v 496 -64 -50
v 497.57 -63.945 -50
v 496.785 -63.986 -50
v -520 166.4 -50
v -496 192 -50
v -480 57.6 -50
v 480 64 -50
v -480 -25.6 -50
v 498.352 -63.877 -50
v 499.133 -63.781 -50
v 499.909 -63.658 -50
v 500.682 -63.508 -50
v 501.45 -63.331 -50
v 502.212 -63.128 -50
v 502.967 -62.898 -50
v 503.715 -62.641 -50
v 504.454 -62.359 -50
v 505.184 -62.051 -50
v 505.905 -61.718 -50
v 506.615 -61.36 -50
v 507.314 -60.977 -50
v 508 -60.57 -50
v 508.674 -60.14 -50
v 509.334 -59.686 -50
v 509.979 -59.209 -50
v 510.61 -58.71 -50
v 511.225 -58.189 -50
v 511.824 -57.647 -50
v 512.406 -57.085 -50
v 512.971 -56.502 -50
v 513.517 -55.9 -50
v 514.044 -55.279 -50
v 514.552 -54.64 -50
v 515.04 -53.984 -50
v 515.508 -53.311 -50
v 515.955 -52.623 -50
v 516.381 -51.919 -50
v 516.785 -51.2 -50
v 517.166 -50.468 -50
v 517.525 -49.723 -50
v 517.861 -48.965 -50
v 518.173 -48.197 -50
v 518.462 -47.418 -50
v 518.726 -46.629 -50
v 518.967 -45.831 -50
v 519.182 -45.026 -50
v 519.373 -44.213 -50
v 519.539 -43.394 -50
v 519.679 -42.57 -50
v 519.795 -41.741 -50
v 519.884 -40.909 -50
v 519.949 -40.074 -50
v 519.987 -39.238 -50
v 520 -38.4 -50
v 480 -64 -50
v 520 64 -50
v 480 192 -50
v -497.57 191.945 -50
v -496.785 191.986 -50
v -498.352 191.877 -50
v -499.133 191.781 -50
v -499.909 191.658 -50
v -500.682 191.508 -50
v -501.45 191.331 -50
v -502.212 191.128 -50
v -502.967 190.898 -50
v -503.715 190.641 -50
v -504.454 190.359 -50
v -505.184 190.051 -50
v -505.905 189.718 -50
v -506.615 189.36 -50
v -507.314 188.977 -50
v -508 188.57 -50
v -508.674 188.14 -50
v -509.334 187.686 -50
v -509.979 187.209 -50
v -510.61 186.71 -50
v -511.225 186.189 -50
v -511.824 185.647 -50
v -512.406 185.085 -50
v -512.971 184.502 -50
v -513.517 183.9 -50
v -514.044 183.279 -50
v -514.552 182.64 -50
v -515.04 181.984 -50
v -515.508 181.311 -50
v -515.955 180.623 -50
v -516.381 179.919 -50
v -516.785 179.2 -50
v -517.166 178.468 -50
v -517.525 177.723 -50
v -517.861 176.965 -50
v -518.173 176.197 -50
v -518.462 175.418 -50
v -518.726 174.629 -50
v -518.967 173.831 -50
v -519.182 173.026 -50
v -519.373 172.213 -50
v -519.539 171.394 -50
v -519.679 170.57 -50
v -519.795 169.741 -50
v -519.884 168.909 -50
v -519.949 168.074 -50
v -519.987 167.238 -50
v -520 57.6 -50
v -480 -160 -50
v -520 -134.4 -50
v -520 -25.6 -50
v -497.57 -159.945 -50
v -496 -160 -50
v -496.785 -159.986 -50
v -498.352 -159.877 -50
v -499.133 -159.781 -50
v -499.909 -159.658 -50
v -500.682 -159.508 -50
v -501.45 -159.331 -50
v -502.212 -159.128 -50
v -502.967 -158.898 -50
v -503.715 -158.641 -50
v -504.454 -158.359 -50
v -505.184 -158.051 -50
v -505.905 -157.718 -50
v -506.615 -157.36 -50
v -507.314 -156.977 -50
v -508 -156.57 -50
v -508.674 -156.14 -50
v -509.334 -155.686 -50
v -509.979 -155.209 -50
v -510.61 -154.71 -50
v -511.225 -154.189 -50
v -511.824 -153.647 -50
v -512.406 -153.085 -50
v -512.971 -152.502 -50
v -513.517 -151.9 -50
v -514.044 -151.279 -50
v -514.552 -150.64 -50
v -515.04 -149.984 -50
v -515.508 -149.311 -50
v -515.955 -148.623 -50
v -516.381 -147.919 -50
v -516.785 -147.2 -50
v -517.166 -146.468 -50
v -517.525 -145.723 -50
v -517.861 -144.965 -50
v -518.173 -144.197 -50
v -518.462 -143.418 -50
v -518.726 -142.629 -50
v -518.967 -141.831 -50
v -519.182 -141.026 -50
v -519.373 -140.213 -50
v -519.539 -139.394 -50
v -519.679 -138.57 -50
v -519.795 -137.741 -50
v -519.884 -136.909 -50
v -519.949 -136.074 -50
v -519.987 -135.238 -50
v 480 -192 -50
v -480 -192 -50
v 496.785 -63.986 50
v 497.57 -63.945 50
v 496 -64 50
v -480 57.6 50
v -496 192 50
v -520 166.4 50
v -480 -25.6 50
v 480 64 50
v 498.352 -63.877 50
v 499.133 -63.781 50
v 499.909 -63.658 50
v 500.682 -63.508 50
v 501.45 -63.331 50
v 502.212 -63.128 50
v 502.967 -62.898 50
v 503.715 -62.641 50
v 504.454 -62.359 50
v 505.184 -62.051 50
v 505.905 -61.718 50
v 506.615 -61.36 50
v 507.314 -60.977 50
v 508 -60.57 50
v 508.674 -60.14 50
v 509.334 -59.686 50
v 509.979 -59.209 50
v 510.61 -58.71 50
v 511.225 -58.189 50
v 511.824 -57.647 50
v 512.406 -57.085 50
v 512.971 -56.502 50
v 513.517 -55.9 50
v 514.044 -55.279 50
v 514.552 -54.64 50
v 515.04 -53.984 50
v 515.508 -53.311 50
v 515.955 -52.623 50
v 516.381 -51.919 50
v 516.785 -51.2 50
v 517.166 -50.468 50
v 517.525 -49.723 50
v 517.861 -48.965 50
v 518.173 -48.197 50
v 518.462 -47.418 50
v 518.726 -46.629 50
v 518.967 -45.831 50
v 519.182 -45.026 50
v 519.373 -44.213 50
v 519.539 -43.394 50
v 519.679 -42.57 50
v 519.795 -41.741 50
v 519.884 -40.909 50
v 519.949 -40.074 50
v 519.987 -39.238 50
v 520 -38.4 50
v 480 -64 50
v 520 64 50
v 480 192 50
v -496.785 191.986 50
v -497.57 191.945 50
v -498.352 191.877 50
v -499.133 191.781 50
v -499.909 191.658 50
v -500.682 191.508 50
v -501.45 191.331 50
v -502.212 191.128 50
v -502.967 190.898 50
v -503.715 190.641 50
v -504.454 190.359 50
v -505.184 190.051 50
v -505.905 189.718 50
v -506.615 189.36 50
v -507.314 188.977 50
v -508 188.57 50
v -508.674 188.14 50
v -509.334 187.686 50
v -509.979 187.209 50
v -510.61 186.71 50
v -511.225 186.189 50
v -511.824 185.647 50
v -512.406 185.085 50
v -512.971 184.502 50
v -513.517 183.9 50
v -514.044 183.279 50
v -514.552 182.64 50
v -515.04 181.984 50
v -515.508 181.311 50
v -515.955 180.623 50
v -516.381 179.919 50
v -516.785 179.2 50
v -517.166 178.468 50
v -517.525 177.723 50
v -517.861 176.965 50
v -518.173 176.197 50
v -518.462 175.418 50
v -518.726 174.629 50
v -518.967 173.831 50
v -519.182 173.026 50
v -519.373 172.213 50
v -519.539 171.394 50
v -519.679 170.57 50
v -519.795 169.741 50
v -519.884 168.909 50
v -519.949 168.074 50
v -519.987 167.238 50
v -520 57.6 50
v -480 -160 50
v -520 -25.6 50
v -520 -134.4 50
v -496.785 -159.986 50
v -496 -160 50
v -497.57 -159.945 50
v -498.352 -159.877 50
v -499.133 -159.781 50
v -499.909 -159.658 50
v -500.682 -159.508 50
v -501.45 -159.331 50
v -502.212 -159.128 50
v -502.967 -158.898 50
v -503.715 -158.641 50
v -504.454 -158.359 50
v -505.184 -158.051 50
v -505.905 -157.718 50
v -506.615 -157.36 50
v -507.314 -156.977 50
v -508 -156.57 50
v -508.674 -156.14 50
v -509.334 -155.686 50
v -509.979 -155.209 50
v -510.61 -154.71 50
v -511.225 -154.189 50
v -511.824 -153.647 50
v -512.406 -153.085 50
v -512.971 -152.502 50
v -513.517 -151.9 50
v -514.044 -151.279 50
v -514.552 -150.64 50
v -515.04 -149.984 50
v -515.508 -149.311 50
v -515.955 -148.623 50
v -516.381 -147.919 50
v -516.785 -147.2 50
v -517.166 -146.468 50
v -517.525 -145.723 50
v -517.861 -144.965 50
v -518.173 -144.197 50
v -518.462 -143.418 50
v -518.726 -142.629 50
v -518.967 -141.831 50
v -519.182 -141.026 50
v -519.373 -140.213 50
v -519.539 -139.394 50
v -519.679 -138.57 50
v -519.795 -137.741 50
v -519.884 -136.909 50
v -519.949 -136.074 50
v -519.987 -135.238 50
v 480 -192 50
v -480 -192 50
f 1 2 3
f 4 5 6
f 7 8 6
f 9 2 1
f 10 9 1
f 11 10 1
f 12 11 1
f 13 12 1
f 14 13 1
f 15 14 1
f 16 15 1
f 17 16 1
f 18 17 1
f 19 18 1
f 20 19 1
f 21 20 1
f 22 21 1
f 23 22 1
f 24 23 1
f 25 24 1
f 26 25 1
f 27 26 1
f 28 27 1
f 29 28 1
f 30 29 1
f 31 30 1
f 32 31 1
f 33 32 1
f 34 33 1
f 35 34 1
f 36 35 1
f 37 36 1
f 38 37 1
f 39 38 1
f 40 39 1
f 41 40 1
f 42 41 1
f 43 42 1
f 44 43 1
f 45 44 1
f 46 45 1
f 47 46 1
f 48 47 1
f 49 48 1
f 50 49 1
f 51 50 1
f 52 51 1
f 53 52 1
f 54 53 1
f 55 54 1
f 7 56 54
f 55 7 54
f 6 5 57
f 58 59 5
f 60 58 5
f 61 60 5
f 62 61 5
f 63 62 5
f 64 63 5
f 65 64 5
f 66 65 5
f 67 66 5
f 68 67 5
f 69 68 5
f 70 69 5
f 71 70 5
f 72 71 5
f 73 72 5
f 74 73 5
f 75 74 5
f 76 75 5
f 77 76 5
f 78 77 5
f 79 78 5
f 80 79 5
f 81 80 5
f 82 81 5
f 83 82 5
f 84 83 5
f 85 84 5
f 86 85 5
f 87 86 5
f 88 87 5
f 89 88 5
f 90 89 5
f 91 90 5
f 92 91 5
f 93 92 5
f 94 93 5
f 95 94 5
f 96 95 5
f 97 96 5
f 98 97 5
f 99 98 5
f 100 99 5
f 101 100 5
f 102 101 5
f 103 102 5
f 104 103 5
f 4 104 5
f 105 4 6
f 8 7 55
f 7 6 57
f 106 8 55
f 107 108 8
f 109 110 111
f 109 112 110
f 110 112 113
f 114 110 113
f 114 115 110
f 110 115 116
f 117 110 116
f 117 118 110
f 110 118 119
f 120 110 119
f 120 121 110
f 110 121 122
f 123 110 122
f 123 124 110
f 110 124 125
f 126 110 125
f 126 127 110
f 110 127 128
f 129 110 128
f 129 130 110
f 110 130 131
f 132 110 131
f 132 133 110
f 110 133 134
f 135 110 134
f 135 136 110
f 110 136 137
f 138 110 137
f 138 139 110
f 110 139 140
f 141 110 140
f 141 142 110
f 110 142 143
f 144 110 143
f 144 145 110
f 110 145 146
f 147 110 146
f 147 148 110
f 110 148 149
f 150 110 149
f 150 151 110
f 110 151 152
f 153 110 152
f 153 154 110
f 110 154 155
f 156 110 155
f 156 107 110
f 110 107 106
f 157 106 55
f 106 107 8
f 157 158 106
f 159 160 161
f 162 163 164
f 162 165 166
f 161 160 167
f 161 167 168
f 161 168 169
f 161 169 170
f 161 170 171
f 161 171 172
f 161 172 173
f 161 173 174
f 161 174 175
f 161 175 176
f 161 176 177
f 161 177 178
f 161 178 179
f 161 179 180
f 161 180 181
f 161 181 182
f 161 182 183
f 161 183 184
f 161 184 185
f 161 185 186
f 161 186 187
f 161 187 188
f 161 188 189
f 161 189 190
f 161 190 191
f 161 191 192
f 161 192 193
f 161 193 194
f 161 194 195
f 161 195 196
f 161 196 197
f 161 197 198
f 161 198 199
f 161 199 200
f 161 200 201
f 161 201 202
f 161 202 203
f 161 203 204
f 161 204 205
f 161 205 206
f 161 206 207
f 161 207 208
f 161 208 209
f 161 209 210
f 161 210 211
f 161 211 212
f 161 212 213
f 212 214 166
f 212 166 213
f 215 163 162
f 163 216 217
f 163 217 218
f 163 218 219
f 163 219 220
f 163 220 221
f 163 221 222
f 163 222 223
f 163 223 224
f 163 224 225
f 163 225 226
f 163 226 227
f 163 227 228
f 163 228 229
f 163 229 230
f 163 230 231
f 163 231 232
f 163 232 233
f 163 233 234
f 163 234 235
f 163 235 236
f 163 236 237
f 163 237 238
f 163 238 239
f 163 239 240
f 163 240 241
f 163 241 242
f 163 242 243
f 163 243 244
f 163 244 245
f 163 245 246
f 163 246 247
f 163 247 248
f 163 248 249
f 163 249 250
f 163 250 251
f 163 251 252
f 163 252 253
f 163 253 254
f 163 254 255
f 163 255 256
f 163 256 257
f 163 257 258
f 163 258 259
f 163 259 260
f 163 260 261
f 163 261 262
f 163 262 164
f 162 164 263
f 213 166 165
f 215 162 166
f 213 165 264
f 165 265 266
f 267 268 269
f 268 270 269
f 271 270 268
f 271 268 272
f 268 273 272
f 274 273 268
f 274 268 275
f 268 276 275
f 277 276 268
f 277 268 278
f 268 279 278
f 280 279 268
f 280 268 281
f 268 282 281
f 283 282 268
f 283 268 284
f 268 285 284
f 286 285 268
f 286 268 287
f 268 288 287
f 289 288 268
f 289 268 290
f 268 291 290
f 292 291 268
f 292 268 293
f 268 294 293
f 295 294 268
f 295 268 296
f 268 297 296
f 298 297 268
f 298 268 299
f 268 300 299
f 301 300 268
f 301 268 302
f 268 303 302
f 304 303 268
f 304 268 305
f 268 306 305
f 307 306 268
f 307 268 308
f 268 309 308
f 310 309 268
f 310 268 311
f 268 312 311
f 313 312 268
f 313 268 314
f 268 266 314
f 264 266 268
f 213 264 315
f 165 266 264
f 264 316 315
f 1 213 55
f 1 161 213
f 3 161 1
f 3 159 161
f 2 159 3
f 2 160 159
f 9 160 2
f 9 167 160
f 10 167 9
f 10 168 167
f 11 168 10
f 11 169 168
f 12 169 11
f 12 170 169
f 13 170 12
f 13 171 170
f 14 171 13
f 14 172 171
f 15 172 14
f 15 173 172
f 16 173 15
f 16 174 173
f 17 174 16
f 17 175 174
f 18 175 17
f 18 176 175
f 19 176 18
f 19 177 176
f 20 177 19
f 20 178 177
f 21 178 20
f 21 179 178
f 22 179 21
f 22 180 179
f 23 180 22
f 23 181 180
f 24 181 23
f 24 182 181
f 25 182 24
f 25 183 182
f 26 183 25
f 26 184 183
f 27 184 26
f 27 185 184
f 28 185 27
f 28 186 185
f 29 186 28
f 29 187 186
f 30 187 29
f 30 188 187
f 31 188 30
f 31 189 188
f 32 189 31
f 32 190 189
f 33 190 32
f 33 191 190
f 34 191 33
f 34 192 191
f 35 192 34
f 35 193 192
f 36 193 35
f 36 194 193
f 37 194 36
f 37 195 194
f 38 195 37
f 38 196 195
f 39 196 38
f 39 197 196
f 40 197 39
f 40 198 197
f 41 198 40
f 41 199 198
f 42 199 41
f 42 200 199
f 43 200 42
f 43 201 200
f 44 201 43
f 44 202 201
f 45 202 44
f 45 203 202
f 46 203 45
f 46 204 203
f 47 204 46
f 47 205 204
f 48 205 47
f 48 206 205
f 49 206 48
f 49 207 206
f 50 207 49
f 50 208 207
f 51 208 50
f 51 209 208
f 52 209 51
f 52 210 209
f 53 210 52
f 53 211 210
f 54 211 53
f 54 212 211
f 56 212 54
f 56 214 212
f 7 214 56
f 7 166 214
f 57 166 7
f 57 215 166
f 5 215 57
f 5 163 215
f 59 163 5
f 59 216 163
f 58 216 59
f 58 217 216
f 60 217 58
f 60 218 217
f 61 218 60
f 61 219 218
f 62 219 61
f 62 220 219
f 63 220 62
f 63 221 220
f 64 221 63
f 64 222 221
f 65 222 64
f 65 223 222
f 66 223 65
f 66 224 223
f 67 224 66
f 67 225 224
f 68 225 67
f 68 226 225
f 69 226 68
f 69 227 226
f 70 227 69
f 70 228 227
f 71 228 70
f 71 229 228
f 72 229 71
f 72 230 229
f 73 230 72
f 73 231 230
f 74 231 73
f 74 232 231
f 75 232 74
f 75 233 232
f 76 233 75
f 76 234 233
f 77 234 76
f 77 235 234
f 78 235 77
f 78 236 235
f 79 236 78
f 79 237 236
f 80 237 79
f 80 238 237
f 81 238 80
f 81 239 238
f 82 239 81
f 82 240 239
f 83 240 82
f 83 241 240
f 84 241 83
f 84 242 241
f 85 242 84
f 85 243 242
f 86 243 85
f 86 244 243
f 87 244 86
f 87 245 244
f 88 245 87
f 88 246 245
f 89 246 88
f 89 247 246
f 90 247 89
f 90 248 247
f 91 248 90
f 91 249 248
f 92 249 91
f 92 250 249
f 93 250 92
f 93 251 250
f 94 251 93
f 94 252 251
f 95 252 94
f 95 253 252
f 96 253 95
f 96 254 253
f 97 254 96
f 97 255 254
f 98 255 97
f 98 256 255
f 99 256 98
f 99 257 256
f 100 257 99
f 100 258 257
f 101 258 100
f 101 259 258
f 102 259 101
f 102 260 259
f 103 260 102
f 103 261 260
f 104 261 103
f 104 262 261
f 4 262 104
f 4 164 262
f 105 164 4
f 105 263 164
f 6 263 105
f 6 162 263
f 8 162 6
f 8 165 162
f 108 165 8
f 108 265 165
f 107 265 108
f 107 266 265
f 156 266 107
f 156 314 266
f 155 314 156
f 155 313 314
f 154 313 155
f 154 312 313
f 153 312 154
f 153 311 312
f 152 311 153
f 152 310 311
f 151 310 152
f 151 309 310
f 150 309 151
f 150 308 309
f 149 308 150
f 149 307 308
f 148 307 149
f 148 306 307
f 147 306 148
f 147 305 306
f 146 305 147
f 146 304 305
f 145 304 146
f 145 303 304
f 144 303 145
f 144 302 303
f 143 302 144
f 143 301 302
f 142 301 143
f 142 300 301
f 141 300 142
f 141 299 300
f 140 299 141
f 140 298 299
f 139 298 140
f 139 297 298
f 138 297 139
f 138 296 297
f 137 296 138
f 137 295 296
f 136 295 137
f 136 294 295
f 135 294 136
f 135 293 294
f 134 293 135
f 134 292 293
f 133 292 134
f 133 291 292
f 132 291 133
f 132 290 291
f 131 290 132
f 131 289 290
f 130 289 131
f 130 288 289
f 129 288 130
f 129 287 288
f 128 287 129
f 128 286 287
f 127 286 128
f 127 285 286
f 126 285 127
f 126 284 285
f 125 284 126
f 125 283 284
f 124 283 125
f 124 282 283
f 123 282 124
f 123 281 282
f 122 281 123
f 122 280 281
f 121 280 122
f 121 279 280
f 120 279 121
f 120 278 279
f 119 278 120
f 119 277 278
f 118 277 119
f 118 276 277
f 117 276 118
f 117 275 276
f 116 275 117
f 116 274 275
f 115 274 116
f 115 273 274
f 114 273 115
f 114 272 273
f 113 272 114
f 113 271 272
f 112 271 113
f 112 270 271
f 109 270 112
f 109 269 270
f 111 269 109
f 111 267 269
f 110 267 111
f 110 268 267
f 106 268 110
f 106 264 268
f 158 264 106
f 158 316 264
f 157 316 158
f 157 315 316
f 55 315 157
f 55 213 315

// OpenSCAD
// file: ../core/quality.scad
// ============================================================================
// MachineBlocks Quality System
// Works with `use <...>` because all exported values are functions.
// ============================================================================

// ----------------------------------------------------------------------------
// Quality classes

function mb_q_functional() = 0; // fit-critical
function mb_q_visual()     = 1; // visible
function mb_q_hidden()     = 2; // internal / invisible

function mb_q_class_from_string(quality) =
    is_num(quality) ? mb_q_clamp(quality, mb_q_functional(), mb_q_hidden()) :
    quality == "functional" ? mb_q_functional() :
    quality == "visual"     ? mb_q_visual()     :
    quality == "hidden"     ? mb_q_hidden()     :
                              mb_q_visual();

// ----------------------------------------------------------------------------
// User quality presets

function mb_q_preview() = 0;
function mb_q_normal()  = 1;
function mb_q_print()   = 2;
function mb_q_render()  = 3;

function mb_q_preset_from_string(quality) =
    is_num(quality) ? mb_q_clamp(quality, mb_q_preview(), mb_q_render()) :
    quality == "preview" ? mb_q_preview() :
    quality == "normal"  ? mb_q_normal()  :
    quality == "print"   ? mb_q_print()   :
    quality == "render"  ? mb_q_render()  :
                           mb_q_normal();

// ----------------------------------------------------------------------------
// Default mappings
//
// Profile row: [segment_length_mm, fn_max]
// Smaller segment length = higher quality.

function mb_q_default_profile() =
[
    [0.55, 32],    // preview
    [0.38, 48],    // normal
    [0.28, 64],    // print
    [0.16, 120]    // render
];

function mb_q_default_class_factors() =
[
    1.00,          // functional
    1.35,          // visual
    2.25           // hidden
];

function mb_q_default_class_min_segments() =
[
    16,            // functional
    12,            // visual
    8              // hidden
];

// ----------------------------------------------------------------------------
// Helpers

function mb_q_clamp(x, a, b) =
    max(a, min(b, x));

function mb_q_make_even(n) =
    (n % 2 == 0) ? n : (n + 1);

function mb_q_max_radius(r) =
    is_list(r)
        ? (
            len(r) == 0
                ? 0
                : max([for (e = r) mb_q_max_radius(e)])
        )
        : r;

// ----------------------------------------------------------------------------
// Preview multiplier
//
// preview_quality:
//   1 = no preview reduction
//   0 = strongest preview reduction
//
// preview_max_mult is applied to segment length, not directly to fn.

function mb_q_preview_mult(preview_quality, preview_max_mult) =
    let(p = mb_q_clamp(preview_quality, 0, 1))
    1 + (1 - p) * (preview_max_mult - 1);

// ----------------------------------------------------------------------------
// Full-circle fn resolver
//
// Contract:
//   returned fn = segment count for a complete 360° circle.
//
// Responsibility:
//   Part/feature chooses class.
//   Shape receives only resolution/fn.

function mb_q_fn_for_radius(
    r,
    q,

    preset = undef,

    profile = undef,
    class_factors = undef,
    class_min_segments = undef,

    segment_multiplier = undef,

    preview_quality = undef,
    preview_max_mult = undef,
    is_preview = $preview
) =
    let(
        qq = mb_q_class_from_string(q),

        pp = mb_q_preset_from_string(preset),

        prof = is_undef(profile)
            ? mb_q_default_profile()
            : profile,

        factors = is_undef(class_factors)
            ? mb_q_default_class_factors()
            : class_factors,

        min_fn = is_undef(class_min_segments)
            ? mb_q_default_class_min_segments()
            : class_min_segments,

        rr = max(0.01, mb_q_max_radius(r)),

        seg_base = prof[pp][0],
        fn_max   = prof[pp][1],

        pm = is_preview
            ? mb_q_preview_mult(
                is_undef(preview_quality) ? 1.0 : preview_quality, 
                is_undef(preview_max_mult) ? 2.5 : preview_max_mult
            )
            : 1.0,

        // Bigger segment length => fewer full-circle segments.
        seg = seg_base * factors[qq] * (is_undef(segment_multiplier) ? 1.0 : segment_multiplier) * pm,

        fn_raw = (2 * PI * rr) / seg,
        fn_rounded = ceil(fn_raw)
    )
    mb_q_clamp(fn_rounded, min_fn[qq], fn_max);

// ----------------------------------------------------------------------------
// Even full-circle fn resolver
//
// Use for cylinders, tubes, studs, holes, and symmetric round geometry.

function mb_q_fn_even_for_radius(
    r,
    q,

    preset = undef,

    profile = undef,
    class_factors = undef,
    class_min_segments = undef,

    segment_multiplier = undef,

    preview_quality = undef,
    preview_max_mult = undef,
    is_preview = $preview
) =
    mb_q_make_even(
        mb_q_fn_for_radius(
            r = r,
            q = q,
            preset = preset,
            profile = profile,
            class_factors = class_factors,
            class_min_segments = class_min_segments,
            segment_multiplier = segment_multiplier,
            preview_quality = preview_quality,
            preview_max_mult = preview_max_mult,
            is_preview = is_preview
        )
    );

// ----------------------------------------------------------------------------
// Partial arc helpers
//
// Preserve the full-circle contract:
//
//   360° -> fn
//   180° -> fn / 2
//    90° -> fn / 4

function mb_q_fn_for_angle(fn, angle, min_n = 3) =
    max(min_n, ceil(fn * abs(angle) / 360));

function mb_q_fn_for_quarter(fn, min_n = 4) =
    mb_q_fn_for_angle(fn, 90, min_n);

function mb_q_fn_for_half(fn, min_n = 6) =
    mb_q_fn_for_angle(fn, 180, min_n);

// ============================================================================
// Usage examples
// ============================================================================

// Stud: functional
module example_q_stud(radius = 2.4, quality = undef) {
    fn = mb_q_fn_even_for_radius(
        r = radius,
        q = mb_q_functional(),
        preset = quality
    );

    cylinder(r = radius, h = 1.8, $fn = fn);
}

// Brick corner: visual
module example_q_brick_corner(radius = 1.0, quality = undef) {
    fn = mb_q_fn_for_radius(
        r = radius,
        q = mb_q_visual(),
        preset = quality
    );

    // mb_corner(radius = radius, resolution = fn);
}

// Groove: hidden
module example_q_groove(radius = 0.3, quality = undef) {
    fn = mb_q_fn_for_radius(
        r = radius,
        q = mb_q_hidden(),
        preset = quality
    );

    // mb_corner(radius = radius, resolution = fn);
}

// Shape-level quarter arc
module example_q_shape_corner(radius = 1.0, resolution = 64) {
    n_a = mb_q_fn_for_quarter(resolution);

    echo(full_circle_resolution = resolution);
    echo(quarter_arc_segments = n_a);
}

function mb_q_fn_for_size(
    size,
    q,
    preset = undef,
    profile = undef,
    class_factors = undef,
    class_min_segments = undef,
    segment_multiplier = undef,
    preview_quality = undef,
    preview_max_mult = undef,
    is_preview = $preview
) =
    mb_q_fn_for_radius(
        r = max(0.5, size / 2),
        q = q,
        preset = preset,
        profile = profile,
        class_factors = class_factors,
        class_min_segments = class_min_segments,
        segment_multiplier = segment_multiplier,
        preview_quality = preview_quality,
        preview_max_mult = preview_max_mult,
        is_preview = is_preview
    );
// main file
use <../core/utils.scad>;
use <../core/quality.scad>;

function _mb_tube_arc_points(cx, cy, rx, ry, a0, a1, segments = 8) =
    [
        for (i = [0:segments])
            let(a = a0 + (a1 - a0) * i / segments)
                [cx + cos(a) * rx, cy + sin(a) * ry]
    ];

function _mb_tube_rr_xy(rr) =
    is_list(rr) ? [max(0, rr[0]), max(0, len(rr) > 1 ? rr[1] : rr[0])]
                : let(r = max(0, is_num(rr) ? rr : 0)) [r, r];

function _mb_tube_scale_rr(rr, mul_r, mul_l) =
    is_list(rr) ? [rr[0] * mul_r, (len(rr) > 1 ? rr[1] : rr[0]) * mul_l]
                : is_num(rr) ? rr * mul_r : 0;

function _mb_tube_rr_max_component(rr) =
    let(xy = _mb_tube_rr_xy(rr))
        max(xy[0], xy[1]);

function _mb_tube_profile_points(
    radius_inner,
    radius_outer,

    start,
    end,

    start_rounding_radius,
    end_rounding_radius,

    clamp_inner_start_thickness,
    clamp_inner_start_height,
    clamp_inner_start_offset,
    clamp_inner_start_rounding_radius,
    
    clamp_inner_end_thickness,
    clamp_inner_end_height,
    clamp_inner_end_offset,
    clamp_inner_end_rounding_radius,

    clamp_outer_start_thickness,
    clamp_outer_start_height,
    clamp_outer_start_offset,
    clamp_outer_start_rounding_radius,
    
    clamp_outer_end_thickness,
    clamp_outer_end_height,
    clamp_outer_end_offset,
    clamp_outer_end_rounding_radius,

    rounding_resolution_edge
) =
    let(
        // radius_inner may be negative (e.g. mb_rail / linear_extrude).
        // mb_tube clamps to >= 0 before calling (rotate_extrude requires x >= 0).
        radius_outer = max(radius_inner, radius_outer),
        ring_thickness = radius_outer - radius_inner,
        max_rr = radius_inner == 0 ? radius_outer : 0.5 * ring_thickness,
        end = max(start, end),
        length = end - start,
        has_inner = radius_inner != 0,

        // Clamp Outer Start
        cbos_offset = min(length, max(0, clamp_outer_start_offset)),
        cbos_height = min(length - cbos_offset, max(0, clamp_outer_start_height)),
        cbos_thickness = clamp_outer_start_thickness < 0 ? sign(clamp_outer_start_thickness) * min(ring_thickness, abs(clamp_outer_start_thickness)) : clamp_outer_start_thickness,
        cbos = cbos_height > 0 && cbos_thickness != 0,
        cbos_rr_raw = _mb_tube_rr_xy(clamp_outer_start_rounding_radius),
        cbos_rx = min(cbos_rr_raw[0], abs(cbos_thickness)),
        cbos_ry = min(cbos_rr_raw[1], cbos_height),
        cbos_round = cbos_rx > 0 && cbos_ry > 0,
        cbos_outer_radius = radius_outer + cbos_thickness,
        cbos_y_start = start + cbos_offset,
        cbos_y_end = cbos_y_start + cbos_height,
        cbos_x_rounding = cbos_outer_radius - sign(clamp_outer_start_thickness) * cbos_rx,
        cbos_y_rounding = cbos_y_start + cbos_ry,

        // Clamp Outer End
        cboe_offset = min(length - cbos_offset - cbos_height, max(0, clamp_outer_end_offset)),
        cboe_height = min(length - cbos_offset - cbos_height - cboe_offset, max(0, clamp_outer_end_height)),
        cboe_thickness = clamp_outer_end_thickness < 0 ? sign(clamp_outer_end_thickness) * min(ring_thickness, abs(clamp_outer_end_thickness)) : clamp_outer_end_thickness,
        cboe = cboe_height > 0 && cboe_thickness != 0,
        cboe_rr_raw = _mb_tube_rr_xy(clamp_outer_end_rounding_radius),
        cboe_rx = min(cboe_rr_raw[0], abs(cboe_thickness)),
        cboe_ry = min(cboe_rr_raw[1], cboe_height),
        cboe_round = cboe_rx > 0 && cboe_ry > 0,
        cboe_outer_radius = radius_outer + cboe_thickness,
        cboe_y_end = end - cboe_offset,
        cboe_y_start = cboe_y_end - cboe_height,
        cboe_x_rounding = cboe_outer_radius - sign(clamp_outer_end_thickness) * cboe_rx,
        cboe_y_rounding = cboe_y_end - cboe_ry,

        // Clamp Inner Start
        cbis_offset = min(length, max(0, clamp_inner_start_offset)),
        cbis_height = min(length - cbis_offset, max(0, clamp_inner_start_height)),
        cbis_thickness = clamp_inner_start_thickness < 0
            ? sign(clamp_inner_start_thickness) * min(ring_thickness, abs(clamp_inner_start_thickness))
            : radius_inner > 0
                ? min(radius_inner, clamp_inner_start_thickness)
                : clamp_inner_start_thickness,
        cbis = has_inner && cbis_height > 0 && cbis_thickness != 0,
        cbis_rr_raw = _mb_tube_rr_xy(clamp_inner_start_rounding_radius),
        cbis_rx = min(cbis_rr_raw[0], abs(cbis_thickness)),
        cbis_ry = min(cbis_rr_raw[1], cbis_height),
        cbis_round = cbis_rx > 0 && cbis_ry > 0,
        cbis_inner_radius = radius_inner - cbis_thickness,
        cbis_y_start = start + cbis_offset,
        cbis_y_end = cbis_y_start + cbis_height,
        cbis_x_rounding = cbis_inner_radius + sign(cbis_thickness) * cbis_rx,
        cbis_y_rounding = cbis_y_start + cbis_ry,

        // Clamp Inner End
        cbie_offset = min(length - cbis_offset - cbis_height, max(0, clamp_inner_end_offset)),
        cbie_height = min(length - cbis_offset - cbis_height - cbie_offset, max(0, clamp_inner_end_height)),
        cbie_thickness = clamp_inner_end_thickness < 0
            ? sign(clamp_inner_end_thickness) * min(ring_thickness, abs(clamp_inner_end_thickness))
            : radius_inner > 0
                ? min(radius_inner, clamp_inner_end_thickness)
                : clamp_inner_end_thickness,
        cbie = has_inner && cbie_height > 0 && cbie_thickness != 0,
        cbie_rr_raw = _mb_tube_rr_xy(clamp_inner_end_rounding_radius),
        cbie_rx = min(cbie_rr_raw[0], abs(cbie_thickness)),
        cbie_ry = min(cbie_rr_raw[1], cbie_height),
        cbie_round = cbie_rx > 0 && cbie_ry > 0,
        cbie_inner_radius = radius_inner - cbie_thickness,
        cbie_y_end = end - cbie_offset,
        cbie_y_start = cbie_y_end - cbie_height,
        cbie_x_rounding = cbie_inner_radius + sign(cbie_thickness) * cbie_rx,
        cbie_y_rounding = cbie_y_end - cbie_ry,

        // Start
        si_rr = min(max(0, start_rounding_radius), max_rr, cbis ? cbis_offset : cbie ? (length - cbie_offset - cbie_height) : length),
        so_rr = min(max(0, start_rounding_radius), max_rr, cbos ? cbos_offset : cboe ? (length - cboe_offset - cboe_height) : length),
        si_x_rounding = radius_inner + si_rr,
        so_x_rounding = radius_outer - so_rr,
        si_y_rounding = start + si_rr,
        so_y_rounding = start + so_rr,

        // End
        ei_rr = min(max(0, end_rounding_radius), max_rr, cbie ? cbie_offset : cbis ? (length - cbis_offset - cbis_height) : length),
        eo_rr = min(max(0, end_rounding_radius), max_rr, cboe ? cboe_offset : cbos ? (length - cbos_offset - cbos_height) : length),
        ei_x_rounding = radius_inner + ei_rr,
        eo_x_rounding = radius_outer - eo_rr,
        ei_y_rounding = end - ei_rr,
        eo_y_rounding = end - eo_rr
    )
    concat(
        // Start Inner
        cbis && cbis_offset == 0 ? [] : concat(
            si_rr > 0 && has_inner ? concat(
                [
                    [radius_inner, si_y_rounding]
                ],
                _mb_tube_arc_points(
                    cx = si_x_rounding,
                    cy = si_y_rounding,
                    rx = si_rr,
                    ry = si_rr,
                    a0 = -90,
                    a1 = -180,
                    segments = rounding_resolution_edge
                )
            ) : [],
            [
                [si_rr > 0 && has_inner ? si_x_rounding : radius_inner, start]
            ]
        ),

        // Start Outer
        cbos && cbos_offset == 0 ? [] : concat(
            [
                [so_rr > 0 ? so_x_rounding : radius_outer, start],
            ],
            so_rr > 0 ? concat(
                _mb_tube_arc_points(
                    cx = so_x_rounding,
                    cy = so_y_rounding,
                    rx = so_rr,
                    ry = so_rr,
                    a0 = -90,
                    a1 = 0,
                    segments = rounding_resolution_edge
                ),
                [
                    [radius_outer, so_y_rounding]
                ]
            ) : []
        ),

        // Clamp Outer Start
        cbos ? concat(
            cbos_offset == 0 ? [] : [
                [radius_outer, cbos_y_start]
            ],
            [
                [cbos_round ? cbos_x_rounding : cbos_outer_radius, cbos_y_start],
            ],
            cbos_round ? _mb_tube_arc_points(
                cx = cbos_x_rounding,
                cy = cbos_y_rounding,
                rx = cbos_rx,
                ry = cbos_ry,
                a0 = -90,
                a1 = cbos_thickness < 0 ? -180 : 0,
                segments = rounding_resolution_edge
            ) : [],
            [
                [cbos_outer_radius, cbos_y_end],
                [radius_outer, cbos_y_end]
            ]
        ) : [],

        // Clamp Outer End
        cboe ? concat(
            [
                [radius_outer, cboe_y_start],
                [cboe_outer_radius, cboe_y_start],
                [cboe_outer_radius, cboe_round ? cboe_y_rounding : cboe_y_end]
            ],
            cboe_round ? _mb_tube_arc_points(
                cx = cboe_x_rounding,
                cy = cboe_y_rounding,
                rx = cboe_rx,
                ry = cboe_ry,
                a0 = cboe_thickness < 0 ? 180 : 0,
                a1 = 90,
                segments = rounding_resolution_edge
            ) : [],
            cboe_offset == 0 ? [] : [
                [radius_outer, cboe_y_end]
            ]
        ) : [],

        // End Outer
        cboe && cboe_offset == 0 ? [] : concat(
            eo_rr > 0 ? concat(
                [
                    [radius_outer, eo_y_rounding],
                ],
                _mb_tube_arc_points(
                    cx = eo_x_rounding,
                    cy = eo_y_rounding,
                    rx = eo_rr,
                    ry = eo_rr,
                    a0 = 0,
                    a1 = 90,
                    segments = rounding_resolution_edge
                )
            ) : [],
            [
                [eo_rr > 0 ? eo_x_rounding : radius_outer, end]
            ]
        ),

        // End Inner
        cbie && cbie_offset == 0 ? [] : concat(
            ei_rr > 0 && has_inner ? concat(
                [
                    [ei_x_rounding, end]
                ],
                _mb_tube_arc_points(
                    cx = ei_x_rounding,
                    cy = ei_y_rounding,
                    rx = ei_rr,
                    ry = ei_rr,
                    a0 = 180,
                    a1 = 90,
                    segments = rounding_resolution_edge
                )
            ) : [],
            [
                [radius_inner, ei_rr > 0 && has_inner ? ei_y_rounding : end]
            ]
        ),

        // Clamp Inner End (walk end→start; structure like Clamp Outer Start)
        cbie ? concat(
            cbie_offset == 0 ? [] : [
                [radius_inner, cbie_y_end]
            ],
            [
                [cbie_round ? cbie_x_rounding : cbie_inner_radius, cbie_y_end],
            ],
            cbie_round ? _mb_tube_arc_points(
                cx = cbie_x_rounding,
                cy = cbie_y_rounding,
                rx = cbie_rx,
                ry = cbie_ry,
                a0 = 90,
                a1 = cbie_thickness < 0 ? 0 : 180,
                segments = rounding_resolution_edge
            ) : [],
            [
                [cbie_inner_radius, cbie_y_start],
                [radius_inner, cbie_y_start]
            ]
        ) : [],

        // Clamp Inner Start (walk end→start; structure like Clamp Outer End)
        cbis ? concat(
            [
                [radius_inner, cbis_y_end],
                [cbis_inner_radius, cbis_y_end],
                [cbis_inner_radius, cbis_round ? cbis_y_rounding : cbis_y_start]
            ],
            cbis_round ? _mb_tube_arc_points(
                cx = cbis_x_rounding,
                cy = cbis_y_rounding,
                rx = cbis_rx,
                ry = cbis_ry,
                a0 = cbis_thickness < 0 ? 0 : 180,
                a1 = cbis_thickness < 0 ? -90 : 270,
                segments = rounding_resolution_edge
            ) : [],
            cbis_offset == 0 ? [] : [
                [radius_inner, cbis_y_start]
            ]
        ) : []
    );

module mb_tube(
    radius,
    length,
    rounding_radius = undef,

    clamp_inner_start = undef,
    clamp_inner_end = undef,
    
    clamp_outer_start = undef,
    clamp_outer_end = undef,

    axis = "z",
    offset = undef,
    mul = undef,
    
    rounding_resolution_tube = 64,
    rounding_resolution_edge = 8,

    quality_class_tube = "functional",
    quality_class_edge = "visual",

    quality = "normal",

    q_profile = undef,
    q_class_factors = undef,
    q_class_min_segments = undef,
    q_segment_multiplier = undef,
    q_preview_quality = undef,
    q_preview_max_mult = undef,

    color = "white",
    draw_together = false,
    debug = false
) {
    axis = mb_axis_to_int(axis);
    offset = mb_resolve_xyz(offset, default = [0, 0, 0]);
    mul = mb_resolve_xyz(mul, default = [1, 1, 1]);
    mul_radius = mul[0];
    mul_length = mul[axis];

    start = (is_list(length) ? length[0] : is_num(length) ? -0.5 * length : 0) * mul_length; 
    end = (is_list(length) ? length[1] : is_num(length) ? 0.5 * length : 0) * mul_length;

    radius_inner = max(0, (is_list(radius) && len(radius) > 1 ? radius[0] : 0) * mul_radius);
    radius_outer = (is_list(radius) && len(radius) > 0 ? (len(radius) > 1 ? radius[1] : radius[0]) : radius) * mul_radius; 

    start_rounding_radius = (is_list(rounding_radius) ? rounding_radius[0] : is_num(rounding_radius) ? rounding_radius : 0) * mul_radius;
    end_rounding_radius = (is_list(rounding_radius) ? rounding_radius[1] : is_num(rounding_radius) ? rounding_radius : 0) * mul_radius;
    
    if((end - start) > 0 && (radius_outer - radius_inner) > 0){
        rot = mb_axis_rotate(axis);

        clamp_inner_start_thickness = !is_list(clamp_inner_start) || is_undef(clamp_inner_start[0]) ? 0 : clamp_inner_start[0] * mul_radius;
        clamp_inner_start_height = !is_list(clamp_inner_start) || is_undef(clamp_inner_start[1]) ? 0 : clamp_inner_start[1] * mul_length;
        clamp_inner_start_offset = !is_list(clamp_inner_start) || is_undef(clamp_inner_start[2]) ? 0 : clamp_inner_start[2] * mul_length;
        clamp_inner_start_rounding_radius = !is_list(clamp_inner_start) || is_undef(clamp_inner_start[3])
            ? 0
            : _mb_tube_scale_rr(clamp_inner_start[3], mul_radius, mul_length);

        clamp_inner_end_thickness = !is_list(clamp_inner_end) || is_undef(clamp_inner_end[0]) ? 0 : clamp_inner_end[0] * mul_radius;
        clamp_inner_end_height = !is_list(clamp_inner_end) || is_undef(clamp_inner_end[1]) ? 0 : clamp_inner_end[1] * mul_length;
        clamp_inner_end_offset = !is_list(clamp_inner_end) || is_undef(clamp_inner_end[2]) ? 0 : clamp_inner_end[2] * mul_length;
        clamp_inner_end_rounding_radius = !is_list(clamp_inner_end) || is_undef(clamp_inner_end[3])
            ? 0
            : _mb_tube_scale_rr(clamp_inner_end[3], mul_radius, mul_length);

        clamp_outer_start_thickness = !is_list(clamp_outer_start) || is_undef(clamp_outer_start[0]) ? 0 : clamp_outer_start[0] * mul_radius;
        clamp_outer_start_height = !is_list(clamp_outer_start) || is_undef(clamp_outer_start[1]) ? 0 : clamp_outer_start[1] * mul_length;
        clamp_outer_start_offset = !is_list(clamp_outer_start) || is_undef(clamp_outer_start[2]) ? 0 : clamp_outer_start[2] * mul_length;
        clamp_outer_start_rounding_radius = !is_list(clamp_outer_start) || is_undef(clamp_outer_start[3])
            ? 0
            : _mb_tube_scale_rr(clamp_outer_start[3], mul_radius, mul_length);

        clamp_outer_end_thickness = !is_list(clamp_outer_end) || is_undef(clamp_outer_end[0]) ? 0 : clamp_outer_end[0] * mul_radius;
        clamp_outer_end_height = !is_list(clamp_outer_end) || is_undef(clamp_outer_end[1]) ? 0 : clamp_outer_end[1] * mul_length;
        clamp_outer_end_offset = !is_list(clamp_outer_end) || is_undef(clamp_outer_end[2]) ? 0 : clamp_outer_end[2] * mul_length;
        clamp_outer_end_rounding_radius = !is_list(clamp_outer_end) || is_undef(clamp_outer_end[3])
            ? 0
            : _mb_tube_scale_rr(clamp_outer_end[3], mul_radius, mul_length);

        rounding_resolution_tube = mb_q_fn_even_for_radius(
            r = radius_outer,
            q = quality_class_tube,
            preset = quality,
            profile = q_profile,
            class_factors = q_class_factors,
            class_min_segments = q_class_min_segments,
            segment_multiplier = q_segment_multiplier,
            preview_quality = q_preview_quality,
            preview_max_mult = q_preview_max_mult
        );

        rounding_resolution_edge = mb_q_fn_even_for_radius(
            r = max(
                _mb_tube_rr_max_component(clamp_inner_start_rounding_radius),
                _mb_tube_rr_max_component(clamp_inner_end_rounding_radius),
                _mb_tube_rr_max_component(clamp_outer_start_rounding_radius),
                _mb_tube_rr_max_component(clamp_outer_end_rounding_radius)
            ),
            q = quality_class_edge,
            preset = quality,
            profile = q_profile,
            class_factors = q_class_factors,
            class_min_segments = q_class_min_segments,
            segment_multiplier = q_segment_multiplier,
            preview_quality = q_preview_quality,
            preview_max_mult = q_preview_max_mult
        );

        is_cylinder = radius_inner == 0 && 
            start_rounding_radius == 0 && 
            end_rounding_radius == 0 &&
            (clamp_inner_start_thickness == 0 || clamp_inner_start_height == 0) &&
            (clamp_inner_end_thickness == 0 || clamp_inner_end_height == 0) &&
            (clamp_outer_start_thickness == 0 || clamp_outer_start_height == 0) &&
            (clamp_outer_end_thickness == 0 || clamp_outer_end_height == 0);

        translate([offset[0] * mul[0], offset[1] * mul[1], offset[2] * mul[2]])
            rotate(rot){
                if(is_cylinder || draw_together){
                    color(draw_together || debug ? "green" : color)
                        translate([0, 0, 0.5 * (start + end)])
                            cylinder(r = radius_outer, h = (end - start), center = true, $fn = rounding_resolution_tube);
                }

                if(!is_cylinder || draw_together){
                    color(draw_together || debug ? "yellow" : color)
                        rotate_extrude(convexity = 10, $fn = rounding_resolution_tube)
                            polygon(points = _mb_tube_profile_points(
                                radius_inner = radius_inner,
                                radius_outer = radius_outer,
                                
                                start = start, 
                                end = end,
                            
                                start_rounding_radius = start_rounding_radius,
                                end_rounding_radius = end_rounding_radius,

                                clamp_inner_start_thickness = clamp_inner_start_thickness,
                                clamp_inner_start_height = clamp_inner_start_height,
                                clamp_inner_start_offset = clamp_inner_start_offset,
                                clamp_inner_start_rounding_radius = clamp_inner_start_rounding_radius,
                                
                                clamp_inner_end_thickness = clamp_inner_end_thickness,
                                clamp_inner_end_height = clamp_inner_end_height,
                                clamp_inner_end_offset = clamp_inner_end_offset,
                                clamp_inner_end_rounding_radius = clamp_inner_end_rounding_radius,

                                clamp_outer_start_thickness = clamp_outer_start_thickness,
                                clamp_outer_start_height = clamp_outer_start_height,
                                clamp_outer_start_offset = clamp_outer_start_offset,
                                clamp_outer_start_rounding_radius = clamp_outer_start_rounding_radius,
                                
                                clamp_outer_end_thickness = clamp_outer_end_thickness,
                                clamp_outer_end_height = clamp_outer_end_height,
                                clamp_outer_end_offset = clamp_outer_end_offset,
                                clamp_outer_end_rounding_radius = clamp_outer_end_rounding_radius,

                                rounding_resolution_edge = rounding_resolution_edge
                            ));
                }
            }
    }
}   

module mb_rail(
    radius,
    length,
    rounding_radius = undef,

    clamp_inner_start = undef,
    clamp_inner_end = undef,
    
    clamp_outer_start = undef,
    clamp_outer_end = undef,

    axis = "z",
    offset = undef,
    mul = undef,
    
    rounding_resolution_tube = 64,
    rounding_resolution_edge = 8,

    quality_class_tube = "functional",
    quality_class_edge = "visual",

    quality = "normal",

    q_profile = undef,
    q_class_factors = undef,
    q_class_min_segments = undef,
    q_segment_multiplier = undef,
    q_preview_quality = undef,
    q_preview_max_mult = undef,

    color = "white",
    draw_together = false,
    debug = false
) {
    axis = mb_axis_to_int(axis);
    offset = mb_resolve_xyz(offset, default = [0, 0, 0]);
    mul = mb_resolve_xyz(mul, default = [1, 1, 1]);
    mul_radius = mul[0];
    mul_length = mul[axis];

    start = (is_list(length) ? length[0] : is_num(length) ? -0.5 * length : 0) * mul_length; 
    end = (is_list(length) ? length[1] : is_num(length) ? 0.5 * length : 0) * mul_length;

    radius_inner = (is_list(radius) && len(radius) > 1 ? radius[0] : 0) * mul_radius;
    radius_outer = (is_list(radius) && len(radius) > 0 ? (len(radius) > 1 ? radius[1] : radius[0]) : radius) * mul_radius; 

    start_rounding_radius = (is_list(rounding_radius) ? rounding_radius[0] : is_num(rounding_radius) ? rounding_radius : 0) * mul_radius;
    end_rounding_radius = (is_list(rounding_radius) ? rounding_radius[1] : is_num(rounding_radius) ? rounding_radius : 0) * mul_radius;
    
    if((end - start) > 0 && (radius_outer - radius_inner) > 0){
        rot = mb_axis_rotate(axis);

        clamp_inner_start_thickness = !is_list(clamp_inner_start) || is_undef(clamp_inner_start[0]) ? 0 : clamp_inner_start[0] * mul_radius;
        clamp_inner_start_height = !is_list(clamp_inner_start) || is_undef(clamp_inner_start[1]) ? 0 : clamp_inner_start[1] * mul_length;
        clamp_inner_start_offset = !is_list(clamp_inner_start) || is_undef(clamp_inner_start[2]) ? 0 : clamp_inner_start[2] * mul_length;
        clamp_inner_start_rounding_radius = !is_list(clamp_inner_start) || is_undef(clamp_inner_start[3])
            ? 0
            : _mb_tube_scale_rr(clamp_inner_start[3], mul_radius, mul_length);

        clamp_inner_end_thickness = !is_list(clamp_inner_end) || is_undef(clamp_inner_end[0]) ? 0 : clamp_inner_end[0] * mul_radius;
        clamp_inner_end_height = !is_list(clamp_inner_end) || is_undef(clamp_inner_end[1]) ? 0 : clamp_inner_end[1] * mul_length;
        clamp_inner_end_offset = !is_list(clamp_inner_end) || is_undef(clamp_inner_end[2]) ? 0 : clamp_inner_end[2] * mul_length;
        clamp_inner_end_rounding_radius = !is_list(clamp_inner_end) || is_undef(clamp_inner_end[3])
            ? 0
            : _mb_tube_scale_rr(clamp_inner_end[3], mul_radius, mul_length);

        clamp_outer_start_thickness = !is_list(clamp_outer_start) || is_undef(clamp_outer_start[0]) ? 0 : clamp_outer_start[0] * mul_radius;
        clamp_outer_start_height = !is_list(clamp_outer_start) || is_undef(clamp_outer_start[1]) ? 0 : clamp_outer_start[1] * mul_length;
        clamp_outer_start_offset = !is_list(clamp_outer_start) || is_undef(clamp_outer_start[2]) ? 0 : clamp_outer_start[2] * mul_length;
        clamp_outer_start_rounding_radius = !is_list(clamp_outer_start) || is_undef(clamp_outer_start[3])
            ? 0
            : _mb_tube_scale_rr(clamp_outer_start[3], mul_radius, mul_length);

        clamp_outer_end_thickness = !is_list(clamp_outer_end) || is_undef(clamp_outer_end[0]) ? 0 : clamp_outer_end[0] * mul_radius;
        clamp_outer_end_height = !is_list(clamp_outer_end) || is_undef(clamp_outer_end[1]) ? 0 : clamp_outer_end[1] * mul_length;
        clamp_outer_end_offset = !is_list(clamp_outer_end) || is_undef(clamp_outer_end[2]) ? 0 : clamp_outer_end[2] * mul_length;
        clamp_outer_end_rounding_radius = !is_list(clamp_outer_end) || is_undef(clamp_outer_end[3])
            ? 0
            : _mb_tube_scale_rr(clamp_outer_end[3], mul_radius, mul_length);

        rounding_resolution_tube = mb_q_fn_even_for_radius(
            r = radius_outer,
            q = quality_class_tube,
            preset = quality,
            profile = q_profile,
            class_factors = q_class_factors,
            class_min_segments = q_class_min_segments,
            segment_multiplier = q_segment_multiplier,
            preview_quality = q_preview_quality,
            preview_max_mult = q_preview_max_mult
        );

        rounding_resolution_edge = mb_q_fn_even_for_radius(
            r = max(
                _mb_tube_rr_max_component(clamp_inner_start_rounding_radius),
                _mb_tube_rr_max_component(clamp_inner_end_rounding_radius),
                _mb_tube_rr_max_component(clamp_outer_start_rounding_radius),
                _mb_tube_rr_max_component(clamp_outer_end_rounding_radius)
            ),
            q = quality_class_edge,
            preset = quality,
            profile = q_profile,
            class_factors = q_class_factors,
            class_min_segments = q_class_min_segments,
            segment_multiplier = q_segment_multiplier,
            preview_quality = q_preview_quality,
            preview_max_mult = q_preview_max_mult
        );

        is_cylinder = radius_inner == 0 && 
            start_rounding_radius == 0 && 
            end_rounding_radius == 0 &&
            (clamp_inner_start_thickness == 0 || clamp_inner_start_height == 0) &&
            (clamp_inner_end_thickness == 0 || clamp_inner_end_height == 0) &&
            (clamp_outer_start_thickness == 0 || clamp_outer_start_height == 0) &&
            (clamp_outer_end_thickness == 0 || clamp_outer_end_height == 0);

        translate([offset[0] * mul[0], offset[1] * mul[1], offset[2] * mul[2]])
            rotate(rot){
                if(is_cylinder || draw_together){
                    color(draw_together || debug ? "green" : color)
                        translate([0, 0, 0.5 * (start + end)])
                            cylinder(r = radius_outer, h = (end - start), center = true, $fn = rounding_resolution_tube);
                }

                if(!is_cylinder || draw_together){
                    color(draw_together || debug ? "yellow" : color)
                        linear_extrude(convexity = 10, height = 100, center = true)
                            polygon(points = _mb_tube_profile_points(
                                radius_inner = radius_inner,
                                radius_outer = radius_outer,
                                

                                start = start, 
                                end = end,
                            
                                start_rounding_radius = start_rounding_radius,
                                end_rounding_radius = end_rounding_radius,

                                clamp_inner_start_thickness = clamp_inner_start_thickness,
                                clamp_inner_start_height = clamp_inner_start_height,
                                clamp_inner_start_offset = clamp_inner_start_offset,
                                clamp_inner_start_rounding_radius = clamp_inner_start_rounding_radius,
                                
                                clamp_inner_end_thickness = clamp_inner_end_thickness,
                                clamp_inner_end_height = clamp_inner_end_height,
                                clamp_inner_end_offset = clamp_inner_end_offset,
                                clamp_inner_end_rounding_radius = clamp_inner_end_rounding_radius,

                                clamp_outer_start_thickness = clamp_outer_start_thickness,
                                clamp_outer_start_height = clamp_outer_start_height,
                                clamp_outer_start_offset = clamp_outer_start_offset,
                                clamp_outer_start_rounding_radius = clamp_outer_start_rounding_radius,
                                
                                clamp_outer_end_thickness = clamp_outer_end_thickness,
                                clamp_outer_end_height = clamp_outer_end_height,
                                clamp_outer_end_offset = clamp_outer_end_offset,
                                clamp_outer_end_rounding_radius = clamp_outer_end_rounding_radius,

                                rounding_resolution_edge = rounding_resolution_edge
                            ));
                }
            }
    }
}   
/*
* --------------
* START EXAMPLES
* --------------
*/

mb_rail(
    radius = [-60, 60],
    length = [-60, 60],
    
    rounding_radius = 0, //[4, 12],
    axis = "z",
    offset = undef,
    mul = [8, 8, 3.2],

    clamp_inner_start = [5, 42, 10, [3, 8]],
    clamp_inner_end = [5, 42, 0, [3, 8]],
    
    clamp_outer_start = [5, 40, 40, [3, 8]],
    clamp_outer_end = [5, 40, 40, 0],
    

    rounding_resolution_tube = 64,
    rounding_resolution_edge = 8,

    draw_together = false,
    debug = true
);
